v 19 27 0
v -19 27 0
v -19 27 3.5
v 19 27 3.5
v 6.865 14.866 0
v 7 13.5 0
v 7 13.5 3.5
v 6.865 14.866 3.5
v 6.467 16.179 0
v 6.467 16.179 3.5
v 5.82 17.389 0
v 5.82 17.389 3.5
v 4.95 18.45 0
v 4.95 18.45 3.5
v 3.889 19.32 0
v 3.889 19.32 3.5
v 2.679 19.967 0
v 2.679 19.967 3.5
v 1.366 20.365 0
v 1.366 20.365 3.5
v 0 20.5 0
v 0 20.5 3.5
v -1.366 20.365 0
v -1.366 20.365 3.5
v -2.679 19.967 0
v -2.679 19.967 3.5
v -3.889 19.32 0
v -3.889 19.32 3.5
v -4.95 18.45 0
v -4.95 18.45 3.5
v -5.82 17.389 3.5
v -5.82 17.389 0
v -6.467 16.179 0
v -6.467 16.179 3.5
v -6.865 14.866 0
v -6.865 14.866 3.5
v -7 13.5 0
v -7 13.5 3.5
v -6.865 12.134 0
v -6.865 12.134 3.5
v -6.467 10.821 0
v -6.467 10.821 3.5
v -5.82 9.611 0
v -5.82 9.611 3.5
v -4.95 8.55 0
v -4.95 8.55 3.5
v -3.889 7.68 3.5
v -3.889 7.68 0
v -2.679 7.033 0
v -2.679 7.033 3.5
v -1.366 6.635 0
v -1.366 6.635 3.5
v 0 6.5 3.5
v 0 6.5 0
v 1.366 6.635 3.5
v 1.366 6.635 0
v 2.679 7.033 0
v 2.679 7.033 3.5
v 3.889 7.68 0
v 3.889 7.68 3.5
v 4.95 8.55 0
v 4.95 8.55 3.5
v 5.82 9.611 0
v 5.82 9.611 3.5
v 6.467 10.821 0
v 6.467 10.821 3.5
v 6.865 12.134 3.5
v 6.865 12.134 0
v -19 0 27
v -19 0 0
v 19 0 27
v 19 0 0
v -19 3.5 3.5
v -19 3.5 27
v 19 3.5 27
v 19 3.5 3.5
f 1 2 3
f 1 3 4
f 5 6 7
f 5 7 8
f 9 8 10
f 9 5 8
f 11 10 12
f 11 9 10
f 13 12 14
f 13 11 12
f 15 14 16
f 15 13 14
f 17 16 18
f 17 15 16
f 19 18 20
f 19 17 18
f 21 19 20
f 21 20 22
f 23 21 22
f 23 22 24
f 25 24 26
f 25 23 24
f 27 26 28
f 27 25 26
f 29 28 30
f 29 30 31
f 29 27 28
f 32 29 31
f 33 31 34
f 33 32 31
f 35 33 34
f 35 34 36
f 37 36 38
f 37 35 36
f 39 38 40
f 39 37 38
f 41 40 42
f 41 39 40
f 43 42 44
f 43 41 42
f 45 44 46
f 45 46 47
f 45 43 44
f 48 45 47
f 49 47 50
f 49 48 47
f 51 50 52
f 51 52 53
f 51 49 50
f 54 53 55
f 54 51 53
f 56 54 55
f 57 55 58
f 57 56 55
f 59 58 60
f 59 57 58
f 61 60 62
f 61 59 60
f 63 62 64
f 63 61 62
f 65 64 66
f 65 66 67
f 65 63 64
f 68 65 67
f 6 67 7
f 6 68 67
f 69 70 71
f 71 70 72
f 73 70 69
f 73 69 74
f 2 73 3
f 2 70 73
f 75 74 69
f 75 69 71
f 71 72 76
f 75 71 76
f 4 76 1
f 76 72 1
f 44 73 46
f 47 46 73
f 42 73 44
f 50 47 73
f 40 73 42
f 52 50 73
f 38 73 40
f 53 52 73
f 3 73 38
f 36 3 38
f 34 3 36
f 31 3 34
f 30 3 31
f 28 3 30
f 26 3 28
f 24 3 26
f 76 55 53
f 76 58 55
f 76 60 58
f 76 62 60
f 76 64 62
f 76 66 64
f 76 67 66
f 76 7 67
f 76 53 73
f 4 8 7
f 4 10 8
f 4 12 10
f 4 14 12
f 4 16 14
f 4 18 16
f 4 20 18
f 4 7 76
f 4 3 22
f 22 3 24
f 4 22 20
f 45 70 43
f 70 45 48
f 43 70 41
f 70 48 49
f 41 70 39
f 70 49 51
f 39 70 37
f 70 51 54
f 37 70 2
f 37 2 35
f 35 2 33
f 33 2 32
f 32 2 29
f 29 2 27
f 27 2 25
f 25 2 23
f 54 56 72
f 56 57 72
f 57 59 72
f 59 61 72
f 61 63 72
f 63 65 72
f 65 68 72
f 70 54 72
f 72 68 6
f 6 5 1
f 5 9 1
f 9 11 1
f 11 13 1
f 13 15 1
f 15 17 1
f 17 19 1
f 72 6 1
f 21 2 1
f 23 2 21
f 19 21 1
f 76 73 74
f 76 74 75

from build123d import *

# Parameters (mm, degrees)
ESQUISSE1_W        = 38
ESQUISSE1_H        = 23.5
ESQUISSE1_R        = 7
BOSS_EXTRU_1_DEPTH = 3.5
ESQUISSE1_4_W      = 38
ESQUISSE1_4_H      = 3.5
BOSS_EXTRU_2_DEPTH = 27


with BuildPart() as part:
    # Esquisse1 → Boss.-Extru.1 (new body)
    with BuildSketch(Plane.XY):
        with Locations((0, 15.25)):
            Rectangle(ESQUISSE1_W, ESQUISSE1_H)
        with Locations((0, 13.5)):
            Circle(ESQUISSE1_R, mode=Mode.SUBTRACT)
    extrude(amount=BOSS_EXTRU_1_DEPTH)

    # Esquisse1<4> → Boss.-Extru.2 (add)
    with BuildSketch(Plane.XY):
        with Locations((0, 1.75)):
            Rectangle(ESQUISSE1_4_W, ESQUISSE1_4_H)
    extrude(amount=BOSS_EXTRU_2_DEPTH)


solid = part.part
